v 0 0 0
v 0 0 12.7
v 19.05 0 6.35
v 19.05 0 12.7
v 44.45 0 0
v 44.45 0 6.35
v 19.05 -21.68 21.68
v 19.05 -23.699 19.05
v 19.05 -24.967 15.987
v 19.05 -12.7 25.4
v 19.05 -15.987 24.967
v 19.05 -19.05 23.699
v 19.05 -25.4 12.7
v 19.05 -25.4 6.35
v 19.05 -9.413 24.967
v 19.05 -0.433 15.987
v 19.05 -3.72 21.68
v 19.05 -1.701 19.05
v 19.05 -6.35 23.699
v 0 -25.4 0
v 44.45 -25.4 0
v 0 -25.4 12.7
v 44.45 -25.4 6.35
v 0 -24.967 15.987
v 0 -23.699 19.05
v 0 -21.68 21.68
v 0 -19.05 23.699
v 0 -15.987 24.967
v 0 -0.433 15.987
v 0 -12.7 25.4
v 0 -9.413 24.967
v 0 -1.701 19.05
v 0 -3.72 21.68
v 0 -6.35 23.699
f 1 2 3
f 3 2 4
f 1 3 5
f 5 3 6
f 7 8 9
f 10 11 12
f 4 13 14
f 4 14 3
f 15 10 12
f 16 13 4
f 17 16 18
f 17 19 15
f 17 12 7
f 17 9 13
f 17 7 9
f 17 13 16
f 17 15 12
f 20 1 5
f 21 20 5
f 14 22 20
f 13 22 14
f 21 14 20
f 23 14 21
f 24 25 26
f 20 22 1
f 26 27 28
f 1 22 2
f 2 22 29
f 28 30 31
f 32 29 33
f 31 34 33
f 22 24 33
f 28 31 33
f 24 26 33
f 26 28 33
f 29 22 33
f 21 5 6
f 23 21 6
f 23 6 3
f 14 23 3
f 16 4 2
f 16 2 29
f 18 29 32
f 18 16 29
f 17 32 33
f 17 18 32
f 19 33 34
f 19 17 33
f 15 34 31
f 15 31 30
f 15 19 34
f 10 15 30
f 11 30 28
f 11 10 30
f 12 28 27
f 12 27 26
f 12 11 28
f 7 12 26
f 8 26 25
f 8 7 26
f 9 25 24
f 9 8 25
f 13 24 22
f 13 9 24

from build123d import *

# Parameters (mm, degrees)
F1_DEPTH = 25.4
F3_DEPTH = 19.05


with BuildPart() as f1:
    # F0 (on Front) → F1 (new body)
    with BuildSketch(Plane.XZ):
        Polygon((0, 12.7), (0, 0), (44.45, 0), (44.45, 6.35), (19.05, 6.35), (19.05, 12.7), align=None)
    extrude(amount=F1_DEPTH)

    # F2 (on face) → F3 (join, through all)
    with BuildSketch(Plane.YZ.offset(19.05)):
        with BuildLine():
            Line((-25.4, 12.7), (0, 12.7))
            ThreePointArc((0, 12.7), (-12.7, 25.4), (-25.4, 12.7))
        make_face()
    extrude(amount=-F3_DEPTH)


solid = f1.part
